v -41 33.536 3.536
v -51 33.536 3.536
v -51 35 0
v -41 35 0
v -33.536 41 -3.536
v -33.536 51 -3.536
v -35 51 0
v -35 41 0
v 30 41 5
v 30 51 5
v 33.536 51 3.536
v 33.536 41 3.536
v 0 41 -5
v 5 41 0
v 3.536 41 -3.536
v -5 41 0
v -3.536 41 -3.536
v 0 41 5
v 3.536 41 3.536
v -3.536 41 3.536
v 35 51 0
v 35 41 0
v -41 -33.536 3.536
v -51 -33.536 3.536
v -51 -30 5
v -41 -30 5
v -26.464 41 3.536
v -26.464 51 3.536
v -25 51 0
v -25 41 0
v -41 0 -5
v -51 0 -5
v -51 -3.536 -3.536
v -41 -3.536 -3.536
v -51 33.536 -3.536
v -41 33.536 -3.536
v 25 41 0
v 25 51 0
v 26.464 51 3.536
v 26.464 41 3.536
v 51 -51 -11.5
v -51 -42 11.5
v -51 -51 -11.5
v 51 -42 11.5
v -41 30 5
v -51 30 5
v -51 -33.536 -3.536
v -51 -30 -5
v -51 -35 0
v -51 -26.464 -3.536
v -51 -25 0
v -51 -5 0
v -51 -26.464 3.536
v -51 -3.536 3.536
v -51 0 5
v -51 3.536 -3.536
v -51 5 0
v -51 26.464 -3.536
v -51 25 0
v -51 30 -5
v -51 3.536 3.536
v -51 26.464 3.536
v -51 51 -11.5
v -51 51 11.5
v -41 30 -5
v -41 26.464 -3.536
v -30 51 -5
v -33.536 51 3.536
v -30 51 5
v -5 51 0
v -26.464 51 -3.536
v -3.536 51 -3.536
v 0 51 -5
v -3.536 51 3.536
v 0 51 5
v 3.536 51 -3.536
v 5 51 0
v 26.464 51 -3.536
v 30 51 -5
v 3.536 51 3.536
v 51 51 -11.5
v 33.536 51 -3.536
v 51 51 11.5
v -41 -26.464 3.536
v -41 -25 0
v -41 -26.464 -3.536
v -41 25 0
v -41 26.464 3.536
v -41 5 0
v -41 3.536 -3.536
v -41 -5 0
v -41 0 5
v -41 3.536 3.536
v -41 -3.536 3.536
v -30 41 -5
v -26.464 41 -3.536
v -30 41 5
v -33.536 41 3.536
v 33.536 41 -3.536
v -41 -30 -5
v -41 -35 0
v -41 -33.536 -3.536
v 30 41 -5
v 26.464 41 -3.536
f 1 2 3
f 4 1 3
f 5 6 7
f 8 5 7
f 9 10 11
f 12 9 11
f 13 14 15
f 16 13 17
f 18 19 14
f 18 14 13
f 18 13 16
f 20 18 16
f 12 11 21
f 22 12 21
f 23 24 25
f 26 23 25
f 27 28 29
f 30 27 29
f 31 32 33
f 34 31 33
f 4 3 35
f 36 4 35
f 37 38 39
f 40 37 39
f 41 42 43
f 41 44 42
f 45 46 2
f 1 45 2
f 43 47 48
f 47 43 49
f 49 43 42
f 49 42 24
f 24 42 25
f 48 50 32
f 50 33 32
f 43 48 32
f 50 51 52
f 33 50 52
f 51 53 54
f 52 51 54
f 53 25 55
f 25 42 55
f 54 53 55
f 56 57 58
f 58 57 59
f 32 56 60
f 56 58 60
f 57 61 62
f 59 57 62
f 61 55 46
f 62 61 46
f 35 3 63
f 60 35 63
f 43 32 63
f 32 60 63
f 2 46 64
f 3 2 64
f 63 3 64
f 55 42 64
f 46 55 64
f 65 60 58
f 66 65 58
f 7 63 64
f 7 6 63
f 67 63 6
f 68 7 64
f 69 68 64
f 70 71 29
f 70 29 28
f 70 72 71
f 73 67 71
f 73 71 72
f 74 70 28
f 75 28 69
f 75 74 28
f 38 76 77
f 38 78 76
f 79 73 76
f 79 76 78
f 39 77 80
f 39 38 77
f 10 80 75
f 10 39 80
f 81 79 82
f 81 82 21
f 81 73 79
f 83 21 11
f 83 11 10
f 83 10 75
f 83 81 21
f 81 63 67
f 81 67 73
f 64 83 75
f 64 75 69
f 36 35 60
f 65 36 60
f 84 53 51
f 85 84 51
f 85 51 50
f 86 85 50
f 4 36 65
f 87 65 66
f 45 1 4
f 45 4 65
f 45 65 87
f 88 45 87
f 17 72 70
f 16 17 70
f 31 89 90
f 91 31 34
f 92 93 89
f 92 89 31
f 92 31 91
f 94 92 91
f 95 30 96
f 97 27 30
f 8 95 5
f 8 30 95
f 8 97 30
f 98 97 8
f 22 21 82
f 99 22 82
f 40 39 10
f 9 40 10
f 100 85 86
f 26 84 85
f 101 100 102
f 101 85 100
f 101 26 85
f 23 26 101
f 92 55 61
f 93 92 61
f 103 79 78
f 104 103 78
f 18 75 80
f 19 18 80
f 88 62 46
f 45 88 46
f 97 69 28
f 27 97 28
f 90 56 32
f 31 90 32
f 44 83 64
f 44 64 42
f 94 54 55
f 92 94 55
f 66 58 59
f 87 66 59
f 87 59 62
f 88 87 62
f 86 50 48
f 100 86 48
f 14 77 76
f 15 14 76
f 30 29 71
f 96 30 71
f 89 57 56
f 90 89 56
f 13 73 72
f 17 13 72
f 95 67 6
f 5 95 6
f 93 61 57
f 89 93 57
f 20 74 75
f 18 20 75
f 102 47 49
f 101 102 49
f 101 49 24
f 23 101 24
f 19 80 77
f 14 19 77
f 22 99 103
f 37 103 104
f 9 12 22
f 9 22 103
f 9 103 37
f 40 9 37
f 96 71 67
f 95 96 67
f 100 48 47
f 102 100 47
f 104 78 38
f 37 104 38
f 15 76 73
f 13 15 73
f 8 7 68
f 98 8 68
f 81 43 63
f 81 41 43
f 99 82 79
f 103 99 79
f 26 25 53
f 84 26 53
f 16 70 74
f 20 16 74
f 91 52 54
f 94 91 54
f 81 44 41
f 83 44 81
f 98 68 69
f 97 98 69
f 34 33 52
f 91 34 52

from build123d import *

# Parameters (mm, degrees)
F1_DEPTH = 51
F3_DEPTH = 10
F5_DEPTH = 10


with BuildPart() as f1:
    # F0 (on Right) → F1 (new body, symmetric)
    with BuildSketch(Plane.YZ):
        Polygon((-51, -11.5), (51, -11.5), (51, 11.5), (-42, 11.5), align=None)
    extrude(amount=F1_DEPTH, both=True)

    # F2 (on face) → F3 (cut)
    with BuildSketch(Plane(origin=(0, 51, 0), x_dir=(-1, 0, 0), z_dir=(0, 1, 0))):
        Polygon((-3.535534, -3.535534), (0, -5), (3.535534, -3.535534), (5, 0), (3.535534, 3.535534), (0, 5), (-3.535534, 3.535534), (-5, 0), align=None)
        Polygon((33.535534, 3.535534), (30, 5), (26.464466, 3.535534), (25, 0), (26.464466, -3.535534), (30, -5), (33.535534, -3.535534), (35, 0), align=None)
        Polygon((-25, 0), (-26.464466, 3.535534), (-30, 5), (-33.535534, 3.535534), (-35, 0), (-33.535534, -3.535534), (-30, -5), (-26.464466, -3.535534), align=None)
    extrude(amount=-F3_DEPTH, mode=Mode.SUBTRACT)

    # F4 (on face) → F5 (cut)
    with BuildSketch(Plane(origin=(-51, 0, 0), x_dir=(0, -1, 0), z_dir=(-1, 0, 0))):
        Polygon((-3.535534, -3.535534), (0, -5), (3.535534, -3.535534), (5, 0), (3.535534, 3.535534), (0, 5), (-3.535534, 3.535534), (-5, 0), align=None)
        Polygon((33.535534, 3.535534), (30, 5), (26.464466, 3.535534), (25, 0), (26.464466, -3.535534), (30, -5), (33.535534, -3.535534), (35, 0), align=None)
        Polygon((-25, 0), (-26.464466, 3.535534), (-30, 5), (-33.535534, 3.535534), (-35, 0), (-33.535534, -3.535534), (-30, -5), (-26.464466, -3.535534), align=None)
    extrude(amount=-F5_DEPTH, mode=Mode.SUBTRACT)


solid = f1.part
